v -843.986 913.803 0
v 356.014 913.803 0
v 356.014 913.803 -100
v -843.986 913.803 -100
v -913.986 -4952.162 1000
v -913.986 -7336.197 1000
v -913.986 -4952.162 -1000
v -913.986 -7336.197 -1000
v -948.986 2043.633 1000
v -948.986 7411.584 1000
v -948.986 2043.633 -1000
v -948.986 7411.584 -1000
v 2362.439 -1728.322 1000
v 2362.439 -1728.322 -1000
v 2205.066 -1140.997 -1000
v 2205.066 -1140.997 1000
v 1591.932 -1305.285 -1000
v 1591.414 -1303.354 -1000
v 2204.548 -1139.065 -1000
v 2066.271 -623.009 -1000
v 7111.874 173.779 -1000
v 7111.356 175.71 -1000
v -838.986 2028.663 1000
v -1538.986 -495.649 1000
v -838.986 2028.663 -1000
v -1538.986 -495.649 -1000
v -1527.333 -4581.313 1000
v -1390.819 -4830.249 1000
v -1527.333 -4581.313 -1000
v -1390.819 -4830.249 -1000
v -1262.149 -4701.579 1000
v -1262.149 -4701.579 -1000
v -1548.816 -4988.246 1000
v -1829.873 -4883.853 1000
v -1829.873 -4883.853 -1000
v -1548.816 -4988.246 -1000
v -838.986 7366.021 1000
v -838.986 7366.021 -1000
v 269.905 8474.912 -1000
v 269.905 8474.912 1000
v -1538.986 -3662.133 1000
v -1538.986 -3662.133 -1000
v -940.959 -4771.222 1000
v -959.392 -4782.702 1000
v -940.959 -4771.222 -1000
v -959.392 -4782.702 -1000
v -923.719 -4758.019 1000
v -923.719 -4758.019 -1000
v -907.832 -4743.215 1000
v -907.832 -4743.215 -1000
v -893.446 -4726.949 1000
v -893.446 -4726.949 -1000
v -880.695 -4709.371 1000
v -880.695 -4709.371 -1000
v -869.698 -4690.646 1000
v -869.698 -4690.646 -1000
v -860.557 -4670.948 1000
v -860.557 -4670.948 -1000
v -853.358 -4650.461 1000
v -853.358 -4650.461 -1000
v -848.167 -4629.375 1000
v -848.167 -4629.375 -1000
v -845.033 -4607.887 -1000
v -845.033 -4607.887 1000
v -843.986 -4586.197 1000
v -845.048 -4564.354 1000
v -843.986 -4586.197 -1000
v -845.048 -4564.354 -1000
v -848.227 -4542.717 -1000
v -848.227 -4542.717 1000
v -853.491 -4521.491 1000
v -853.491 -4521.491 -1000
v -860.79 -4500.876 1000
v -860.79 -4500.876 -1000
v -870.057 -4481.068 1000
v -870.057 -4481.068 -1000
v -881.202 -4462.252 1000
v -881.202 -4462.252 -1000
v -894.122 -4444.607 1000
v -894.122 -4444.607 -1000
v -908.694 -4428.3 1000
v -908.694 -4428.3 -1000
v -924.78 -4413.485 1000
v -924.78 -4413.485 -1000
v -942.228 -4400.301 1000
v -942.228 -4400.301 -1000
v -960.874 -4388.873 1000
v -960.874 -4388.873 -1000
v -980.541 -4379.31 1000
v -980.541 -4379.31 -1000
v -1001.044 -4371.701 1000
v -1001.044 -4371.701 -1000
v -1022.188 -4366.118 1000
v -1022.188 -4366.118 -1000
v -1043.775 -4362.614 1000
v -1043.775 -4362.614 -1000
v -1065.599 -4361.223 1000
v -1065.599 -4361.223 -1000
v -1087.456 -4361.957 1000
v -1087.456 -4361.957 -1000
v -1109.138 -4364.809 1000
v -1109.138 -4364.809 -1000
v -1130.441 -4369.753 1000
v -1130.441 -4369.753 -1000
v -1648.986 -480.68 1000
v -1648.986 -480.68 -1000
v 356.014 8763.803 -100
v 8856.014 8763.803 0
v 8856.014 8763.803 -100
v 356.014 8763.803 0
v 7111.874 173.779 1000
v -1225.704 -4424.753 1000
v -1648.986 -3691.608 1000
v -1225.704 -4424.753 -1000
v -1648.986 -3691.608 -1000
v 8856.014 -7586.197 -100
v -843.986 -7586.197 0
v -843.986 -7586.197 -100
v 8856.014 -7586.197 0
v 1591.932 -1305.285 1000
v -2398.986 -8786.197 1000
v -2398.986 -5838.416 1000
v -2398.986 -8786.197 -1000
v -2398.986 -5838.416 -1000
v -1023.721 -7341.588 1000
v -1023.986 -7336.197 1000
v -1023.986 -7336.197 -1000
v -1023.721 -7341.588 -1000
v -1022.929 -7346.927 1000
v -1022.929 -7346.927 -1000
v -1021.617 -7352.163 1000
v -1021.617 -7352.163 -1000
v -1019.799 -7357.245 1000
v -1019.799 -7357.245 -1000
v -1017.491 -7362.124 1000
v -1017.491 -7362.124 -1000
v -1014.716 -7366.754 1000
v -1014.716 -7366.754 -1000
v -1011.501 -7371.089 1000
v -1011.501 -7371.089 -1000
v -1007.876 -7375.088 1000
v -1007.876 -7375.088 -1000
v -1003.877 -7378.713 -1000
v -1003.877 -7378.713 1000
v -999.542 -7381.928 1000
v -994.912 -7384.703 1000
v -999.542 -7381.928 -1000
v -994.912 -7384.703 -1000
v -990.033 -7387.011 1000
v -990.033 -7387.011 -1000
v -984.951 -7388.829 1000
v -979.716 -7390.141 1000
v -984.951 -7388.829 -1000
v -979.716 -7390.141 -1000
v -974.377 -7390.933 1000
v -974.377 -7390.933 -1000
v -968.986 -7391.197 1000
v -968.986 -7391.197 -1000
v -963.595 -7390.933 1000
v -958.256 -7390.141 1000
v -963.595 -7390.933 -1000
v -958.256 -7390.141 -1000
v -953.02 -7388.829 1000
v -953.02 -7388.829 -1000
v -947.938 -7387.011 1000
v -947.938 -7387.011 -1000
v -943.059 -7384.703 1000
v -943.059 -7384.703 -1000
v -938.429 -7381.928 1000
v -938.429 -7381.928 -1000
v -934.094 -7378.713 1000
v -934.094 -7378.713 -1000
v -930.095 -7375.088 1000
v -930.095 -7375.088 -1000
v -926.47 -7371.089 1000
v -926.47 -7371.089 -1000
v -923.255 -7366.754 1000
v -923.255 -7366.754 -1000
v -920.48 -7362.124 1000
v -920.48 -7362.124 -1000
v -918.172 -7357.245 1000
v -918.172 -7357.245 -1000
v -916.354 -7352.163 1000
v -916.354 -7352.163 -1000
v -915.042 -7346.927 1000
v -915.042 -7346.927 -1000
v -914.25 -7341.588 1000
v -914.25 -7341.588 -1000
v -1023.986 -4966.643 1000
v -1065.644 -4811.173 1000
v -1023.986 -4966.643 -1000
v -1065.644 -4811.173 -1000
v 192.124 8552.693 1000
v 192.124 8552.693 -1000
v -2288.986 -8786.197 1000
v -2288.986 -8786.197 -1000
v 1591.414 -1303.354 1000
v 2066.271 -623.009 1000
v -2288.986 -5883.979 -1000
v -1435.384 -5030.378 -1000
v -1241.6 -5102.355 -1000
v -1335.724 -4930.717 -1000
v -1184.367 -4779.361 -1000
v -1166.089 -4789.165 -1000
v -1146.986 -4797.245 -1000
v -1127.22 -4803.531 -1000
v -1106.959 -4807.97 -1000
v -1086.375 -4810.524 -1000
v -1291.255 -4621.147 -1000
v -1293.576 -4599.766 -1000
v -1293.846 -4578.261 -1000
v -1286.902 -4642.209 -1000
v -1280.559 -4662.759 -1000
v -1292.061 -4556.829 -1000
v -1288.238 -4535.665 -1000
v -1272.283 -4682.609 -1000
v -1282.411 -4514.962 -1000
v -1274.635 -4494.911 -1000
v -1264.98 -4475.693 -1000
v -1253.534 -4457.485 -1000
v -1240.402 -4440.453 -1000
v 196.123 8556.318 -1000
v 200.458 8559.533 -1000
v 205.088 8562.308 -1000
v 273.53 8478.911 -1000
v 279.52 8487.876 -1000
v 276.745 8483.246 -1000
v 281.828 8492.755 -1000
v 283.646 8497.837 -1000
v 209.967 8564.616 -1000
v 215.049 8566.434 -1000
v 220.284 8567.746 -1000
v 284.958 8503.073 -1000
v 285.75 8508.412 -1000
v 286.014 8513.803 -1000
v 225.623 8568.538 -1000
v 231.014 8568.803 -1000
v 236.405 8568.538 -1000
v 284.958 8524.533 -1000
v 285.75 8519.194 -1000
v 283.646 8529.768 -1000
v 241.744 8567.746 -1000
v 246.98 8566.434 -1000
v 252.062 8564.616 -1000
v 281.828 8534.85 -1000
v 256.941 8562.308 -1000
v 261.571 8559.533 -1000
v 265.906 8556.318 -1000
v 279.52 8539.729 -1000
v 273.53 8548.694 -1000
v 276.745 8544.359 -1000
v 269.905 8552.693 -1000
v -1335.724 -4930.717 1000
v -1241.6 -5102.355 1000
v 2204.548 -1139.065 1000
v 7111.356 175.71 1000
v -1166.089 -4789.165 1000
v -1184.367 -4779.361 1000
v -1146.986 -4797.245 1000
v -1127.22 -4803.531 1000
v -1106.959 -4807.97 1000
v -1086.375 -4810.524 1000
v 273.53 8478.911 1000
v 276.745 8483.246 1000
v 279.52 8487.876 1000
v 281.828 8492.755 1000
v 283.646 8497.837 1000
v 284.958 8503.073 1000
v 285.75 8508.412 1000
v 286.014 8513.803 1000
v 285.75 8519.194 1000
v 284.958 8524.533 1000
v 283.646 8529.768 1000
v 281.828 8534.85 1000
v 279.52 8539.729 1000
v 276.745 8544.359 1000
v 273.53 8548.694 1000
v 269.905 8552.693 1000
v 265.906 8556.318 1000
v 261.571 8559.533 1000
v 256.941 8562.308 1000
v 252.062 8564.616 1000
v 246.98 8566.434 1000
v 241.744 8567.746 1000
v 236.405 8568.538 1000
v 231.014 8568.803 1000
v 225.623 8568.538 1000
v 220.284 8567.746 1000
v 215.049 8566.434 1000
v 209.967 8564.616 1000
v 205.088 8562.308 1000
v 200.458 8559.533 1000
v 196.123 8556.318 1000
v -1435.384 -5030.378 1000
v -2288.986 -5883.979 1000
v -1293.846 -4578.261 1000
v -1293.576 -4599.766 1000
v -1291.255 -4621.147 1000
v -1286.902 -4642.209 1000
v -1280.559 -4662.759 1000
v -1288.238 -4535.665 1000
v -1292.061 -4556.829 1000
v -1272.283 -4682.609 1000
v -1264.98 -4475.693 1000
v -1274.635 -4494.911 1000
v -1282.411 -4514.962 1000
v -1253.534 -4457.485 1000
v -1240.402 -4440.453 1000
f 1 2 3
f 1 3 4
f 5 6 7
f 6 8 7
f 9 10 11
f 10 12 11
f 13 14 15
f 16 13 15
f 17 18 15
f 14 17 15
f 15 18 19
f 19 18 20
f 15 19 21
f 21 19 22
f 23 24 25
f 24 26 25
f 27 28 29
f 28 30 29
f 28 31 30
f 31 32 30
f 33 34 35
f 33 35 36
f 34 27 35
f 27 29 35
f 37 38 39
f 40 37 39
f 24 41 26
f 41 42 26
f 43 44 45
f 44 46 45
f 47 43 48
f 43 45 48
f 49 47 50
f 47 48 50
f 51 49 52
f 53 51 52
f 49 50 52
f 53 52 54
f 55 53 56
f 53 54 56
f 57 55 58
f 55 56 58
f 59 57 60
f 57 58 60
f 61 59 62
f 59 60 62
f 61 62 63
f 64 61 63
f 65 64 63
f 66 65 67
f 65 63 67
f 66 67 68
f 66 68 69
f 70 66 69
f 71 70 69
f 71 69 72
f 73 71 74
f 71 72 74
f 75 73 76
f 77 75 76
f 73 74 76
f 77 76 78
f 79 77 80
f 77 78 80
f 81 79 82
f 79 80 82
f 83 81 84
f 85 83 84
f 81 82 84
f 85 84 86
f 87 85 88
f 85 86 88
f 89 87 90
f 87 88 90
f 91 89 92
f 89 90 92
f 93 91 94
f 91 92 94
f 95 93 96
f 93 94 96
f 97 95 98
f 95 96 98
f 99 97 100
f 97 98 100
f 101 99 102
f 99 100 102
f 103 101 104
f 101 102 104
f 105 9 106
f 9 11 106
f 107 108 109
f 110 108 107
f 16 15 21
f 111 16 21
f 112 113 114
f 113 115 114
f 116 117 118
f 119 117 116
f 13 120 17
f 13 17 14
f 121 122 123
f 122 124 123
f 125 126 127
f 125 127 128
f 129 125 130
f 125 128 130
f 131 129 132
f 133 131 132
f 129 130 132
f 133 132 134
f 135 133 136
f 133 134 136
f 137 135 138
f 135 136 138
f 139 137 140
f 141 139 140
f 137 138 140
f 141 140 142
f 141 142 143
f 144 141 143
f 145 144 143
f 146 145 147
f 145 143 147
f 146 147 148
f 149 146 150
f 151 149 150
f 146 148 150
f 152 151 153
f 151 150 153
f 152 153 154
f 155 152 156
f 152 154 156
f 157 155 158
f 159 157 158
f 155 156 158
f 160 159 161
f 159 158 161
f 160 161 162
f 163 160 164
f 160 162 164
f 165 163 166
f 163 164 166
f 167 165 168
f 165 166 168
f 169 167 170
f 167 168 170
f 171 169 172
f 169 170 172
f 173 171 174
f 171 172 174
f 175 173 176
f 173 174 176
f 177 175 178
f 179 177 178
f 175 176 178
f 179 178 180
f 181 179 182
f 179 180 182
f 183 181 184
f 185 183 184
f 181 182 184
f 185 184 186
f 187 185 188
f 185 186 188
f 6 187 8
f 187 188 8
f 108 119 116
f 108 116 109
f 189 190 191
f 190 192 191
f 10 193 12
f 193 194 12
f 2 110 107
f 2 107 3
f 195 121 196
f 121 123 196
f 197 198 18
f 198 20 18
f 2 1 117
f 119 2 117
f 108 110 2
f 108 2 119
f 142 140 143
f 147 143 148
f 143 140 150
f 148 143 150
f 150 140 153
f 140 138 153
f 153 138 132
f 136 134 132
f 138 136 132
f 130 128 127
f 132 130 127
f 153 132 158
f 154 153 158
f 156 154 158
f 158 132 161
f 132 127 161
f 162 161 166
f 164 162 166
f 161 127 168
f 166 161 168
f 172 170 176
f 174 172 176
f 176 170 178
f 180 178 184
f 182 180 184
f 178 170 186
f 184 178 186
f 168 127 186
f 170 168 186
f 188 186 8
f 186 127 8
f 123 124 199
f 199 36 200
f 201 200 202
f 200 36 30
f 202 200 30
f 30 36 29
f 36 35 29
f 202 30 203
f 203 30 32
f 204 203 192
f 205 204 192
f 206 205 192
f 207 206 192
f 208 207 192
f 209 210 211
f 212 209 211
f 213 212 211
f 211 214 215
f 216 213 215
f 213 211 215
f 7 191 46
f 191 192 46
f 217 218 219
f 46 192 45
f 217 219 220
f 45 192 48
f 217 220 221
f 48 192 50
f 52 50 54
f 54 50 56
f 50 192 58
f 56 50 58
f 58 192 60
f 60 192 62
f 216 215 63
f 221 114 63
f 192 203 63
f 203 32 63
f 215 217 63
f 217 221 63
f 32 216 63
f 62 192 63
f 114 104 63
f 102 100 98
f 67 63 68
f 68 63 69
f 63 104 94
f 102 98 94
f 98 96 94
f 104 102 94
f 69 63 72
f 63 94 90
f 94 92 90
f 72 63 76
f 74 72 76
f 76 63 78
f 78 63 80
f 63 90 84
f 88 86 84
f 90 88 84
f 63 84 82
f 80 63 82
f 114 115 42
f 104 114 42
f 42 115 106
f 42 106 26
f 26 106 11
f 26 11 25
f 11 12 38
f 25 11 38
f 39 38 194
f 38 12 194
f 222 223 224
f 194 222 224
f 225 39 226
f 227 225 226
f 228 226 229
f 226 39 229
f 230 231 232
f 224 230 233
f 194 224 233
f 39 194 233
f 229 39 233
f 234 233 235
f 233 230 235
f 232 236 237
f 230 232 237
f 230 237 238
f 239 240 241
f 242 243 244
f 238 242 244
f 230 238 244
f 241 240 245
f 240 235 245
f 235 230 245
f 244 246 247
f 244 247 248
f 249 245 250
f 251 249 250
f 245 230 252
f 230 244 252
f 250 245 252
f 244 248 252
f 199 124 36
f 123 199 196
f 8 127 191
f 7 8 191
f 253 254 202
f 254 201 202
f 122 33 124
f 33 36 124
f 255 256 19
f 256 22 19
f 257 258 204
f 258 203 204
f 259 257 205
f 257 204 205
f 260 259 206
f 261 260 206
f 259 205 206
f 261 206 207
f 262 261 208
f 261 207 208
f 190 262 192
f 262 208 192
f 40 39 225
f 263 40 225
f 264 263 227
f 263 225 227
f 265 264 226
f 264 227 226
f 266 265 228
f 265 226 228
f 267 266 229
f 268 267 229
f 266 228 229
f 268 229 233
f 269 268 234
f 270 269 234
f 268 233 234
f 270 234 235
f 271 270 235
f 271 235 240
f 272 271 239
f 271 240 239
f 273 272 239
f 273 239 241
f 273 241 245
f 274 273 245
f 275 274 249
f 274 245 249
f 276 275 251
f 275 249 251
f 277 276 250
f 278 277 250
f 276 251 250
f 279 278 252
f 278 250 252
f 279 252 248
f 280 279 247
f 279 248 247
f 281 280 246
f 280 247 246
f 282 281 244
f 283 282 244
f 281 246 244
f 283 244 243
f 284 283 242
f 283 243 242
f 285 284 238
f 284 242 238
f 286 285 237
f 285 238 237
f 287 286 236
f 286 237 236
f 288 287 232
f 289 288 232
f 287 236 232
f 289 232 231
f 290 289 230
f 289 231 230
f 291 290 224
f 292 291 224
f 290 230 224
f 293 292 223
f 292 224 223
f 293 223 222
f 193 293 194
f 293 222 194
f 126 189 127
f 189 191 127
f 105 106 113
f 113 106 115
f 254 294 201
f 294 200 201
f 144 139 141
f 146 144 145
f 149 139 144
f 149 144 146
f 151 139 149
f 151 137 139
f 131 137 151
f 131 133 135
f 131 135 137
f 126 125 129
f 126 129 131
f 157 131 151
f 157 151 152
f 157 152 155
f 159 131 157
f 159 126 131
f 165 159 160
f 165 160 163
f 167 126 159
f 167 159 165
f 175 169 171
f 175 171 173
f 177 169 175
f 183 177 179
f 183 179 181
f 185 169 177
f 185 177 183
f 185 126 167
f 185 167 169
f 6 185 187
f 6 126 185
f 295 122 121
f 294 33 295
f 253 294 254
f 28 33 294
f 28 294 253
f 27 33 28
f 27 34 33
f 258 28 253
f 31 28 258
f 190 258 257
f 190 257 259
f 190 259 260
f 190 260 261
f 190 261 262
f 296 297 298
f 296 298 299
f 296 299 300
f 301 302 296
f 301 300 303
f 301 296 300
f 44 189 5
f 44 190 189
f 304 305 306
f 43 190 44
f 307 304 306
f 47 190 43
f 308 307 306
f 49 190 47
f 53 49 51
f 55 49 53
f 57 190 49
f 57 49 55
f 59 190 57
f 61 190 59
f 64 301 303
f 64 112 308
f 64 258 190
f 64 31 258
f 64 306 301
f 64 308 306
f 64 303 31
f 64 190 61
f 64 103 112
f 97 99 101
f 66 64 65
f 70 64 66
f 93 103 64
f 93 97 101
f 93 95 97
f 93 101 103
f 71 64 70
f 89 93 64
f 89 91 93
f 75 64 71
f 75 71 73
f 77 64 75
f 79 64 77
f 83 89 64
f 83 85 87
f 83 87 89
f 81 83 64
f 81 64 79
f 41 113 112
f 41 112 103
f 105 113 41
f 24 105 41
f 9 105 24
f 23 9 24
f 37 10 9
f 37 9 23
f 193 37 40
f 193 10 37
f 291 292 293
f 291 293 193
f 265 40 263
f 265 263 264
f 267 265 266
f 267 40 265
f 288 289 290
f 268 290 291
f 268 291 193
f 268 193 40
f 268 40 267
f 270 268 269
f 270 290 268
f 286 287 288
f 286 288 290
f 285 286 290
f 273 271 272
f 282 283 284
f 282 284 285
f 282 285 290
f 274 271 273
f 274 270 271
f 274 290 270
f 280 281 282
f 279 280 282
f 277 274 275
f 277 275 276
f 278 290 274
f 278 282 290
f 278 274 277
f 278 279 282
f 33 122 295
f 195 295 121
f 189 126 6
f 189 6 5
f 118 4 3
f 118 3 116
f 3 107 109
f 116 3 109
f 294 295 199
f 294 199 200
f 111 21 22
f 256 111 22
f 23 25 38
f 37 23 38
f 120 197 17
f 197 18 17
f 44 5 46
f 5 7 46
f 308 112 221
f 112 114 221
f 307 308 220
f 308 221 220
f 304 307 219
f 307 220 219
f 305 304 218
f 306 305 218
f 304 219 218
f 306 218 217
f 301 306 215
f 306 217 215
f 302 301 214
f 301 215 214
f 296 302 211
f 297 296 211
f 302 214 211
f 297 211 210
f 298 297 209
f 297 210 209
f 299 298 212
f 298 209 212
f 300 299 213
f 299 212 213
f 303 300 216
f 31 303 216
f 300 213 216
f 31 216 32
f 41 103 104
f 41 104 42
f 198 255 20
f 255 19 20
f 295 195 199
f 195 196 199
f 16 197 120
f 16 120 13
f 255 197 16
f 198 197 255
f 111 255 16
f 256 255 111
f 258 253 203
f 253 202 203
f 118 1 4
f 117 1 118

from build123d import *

# Parameters (mm, degrees)
F1_DEPTH      = 100
F3_DEPTH      = 1000
F3_DEPTH_BACK = 1000


# Not quite as in the source:
# - a feature names something its author has since deleted; it is built from what else it names


with BuildPart() as f1:
    # F0 (on Top) → F1 (new body)
    with BuildSketch(Plane.XY):
        Polygon((-843.9855575562, 913.8026237488), (-843.9855575561, -7586.1973762512), (8856.0144424439, -7586.1973762512), (8856.0144424438, 8763.8026237488), (356.0144424438, 8763.8026237488), (356.0144424438, 913.8026237488), align=None)
    extrude(amount=-F1_DEPTH)


with BuildPart() as f3:
    # F2 (on Top) → F3 (new body, two sides)
    with BuildSketch(Plane.XY) as f3_sk:
        with BuildLine():
            ThreePointArc((269.9053154091, 8474.9117507835), (281.827816732, 8492.7550349687), (286.0144424438, 8513.8026237488))
            ThreePointArc((286.0144424438, 8513.8026237488), (252.0620312239, 8564.6159980369), (192.1235694786, 8552.693496714))
            Line((192.1235694786, 8552.693496714), (269.9053154091, 8474.9117507835))
        make_face()
        with BuildLine():
            Line((269.9053154091, 8474.9117507835), (192.1235694786, 8552.693496714))
            ThreePointArc((192.1235694786, 8552.693496714), (192.1235694786, 8474.9117507835), (269.9053154091, 8474.9117507835))
        make_face()
        with BuildLine():
            ThreePointArc((269.9053154091, 8474.9117507835), (192.1235694786, 8474.9117507835), (192.1235694786, 8552.693496714))
            Line((192.1235694786, 8552.693496714), (-948.9855575562, 7411.5843696793))
            Line((-948.9855575562, 7411.5843696793), (-948.9855575562, 2043.63269294))
            Line((-948.9855575562, 2043.63269294), (-1648.9855575562, -480.6796410505))
            Line((-1648.9855575562, -480.6796410505), (-1648.9855575562, -3691.6079078613))
            Line((-1648.9855575562, -3691.6079078613), (-1225.7040759107, -4424.7529399743))
            ThreePointArc((-1225.7040759107, -4424.7529399743), (-1181.4855575561, -4391.3416603997), (-1130.4412814944, -4369.7529399743))
            Line((-1130.4412814944, -4369.7529399743), (-1538.9855575562, -3662.1334966938))
            Line((-1538.9855575562, -3662.1334966938), (-1538.9855575562, -495.6488760565))
            Line((-1538.9855575562, -495.6488760565), (-838.9855575562, 2028.663457934))
            Line((-838.9855575562, 2028.663457934), (-838.9855575562, 7366.0208778183))
            Line((-838.9855575562, 7366.0208778183), (269.9053154091, 8474.9117507835))
        make_face()
        with BuildLine():
            ThreePointArc((-1130.4412814944, -4369.7529399743), (-1181.4855575561, -4391.3416603997), (-1225.7040759107, -4424.7529399743))
            ThreePointArc((-1225.7040759107, -4424.7529399743), (-1292.0606513653, -4556.8289830017), (-1262.1489167268, -4701.5789894914))
            ThreePointArc((-1262.1489167268, -4701.5789894914), (-1228.0845833231, -4745.2964020182), (-1184.3671707963, -4779.3607354219))
            ThreePointArc((-1184.3671707963, -4779.3607354219), (-1127.2198427042, -4803.5306871663), (-1065.6438289459, -4811.1725589934))
            ThreePointArc((-1065.6438289459, -4811.1725589934), (-1010.7512724081, -4803.5306871663), (-959.3919880541, -4782.7024640322))
            ThreePointArc((-959.3919880541, -4782.7024640322), (-874.970670063, -4700.1413248883), (-843.9855575562, -4586.1973762512))
            ThreePointArc((-843.9855575562, -4586.1973762512), (-933.3436353604, -4406.6806111761), (-1130.4412814944, -4369.7529399743))
        make_face()
        with BuildLine():
            ThreePointArc((-1184.3671707963, -4779.3607354219), (-1228.0845833231, -4745.2964020182), (-1262.1489167268, -4701.5789894914))
            Line((-1262.1489167268, -4701.5789894914), (-1390.8192221094, -4830.249294874))
            Line((-1390.8192221094, -4830.249294874), (-1335.7238024601, -4930.7173670857))
            Line((-1335.7238024601, -4930.7173670857), (-1184.3671707963, -4779.3607354219))
        make_face()
        Polygon((-1335.7238024601, -4930.7173670857), (-1390.8192221094, -4830.249294874), (-1548.8158805226, -4988.2459532871), (-1435.3841341858, -5030.3776988114), align=None)
        Polygon((-1548.8158805226, -4988.2459532871), (-1390.8192221094, -4830.249294874), (-1527.3326635361, -4581.3131332397), (-1829.8729658127, -4883.8534355164), align=None)
        with BuildLine():
            Line((-913.9855575561, -4952.1615696408), (-959.3919880541, -4782.7024640322))
            ThreePointArc((-959.3919880541, -4782.7024640322), (-1010.7512724081, -4803.5306871663), (-1065.6438289459, -4811.1725589934))
            Line((-1065.6438289459, -4811.1725589934), (-1023.9855575561, -4966.6433443754))
            Line((-1023.9855575561, -4966.6433443754), (-1023.9855575561, -7336.1973762512))
            ThreePointArc((-1023.9855575561, -7336.1973762512), (-968.9855575561, -7281.1973762512), (-913.9855575561, -7336.1973762512))
            Line((-913.9855575561, -7336.1973762512), (-913.9855575561, -4952.1615696408))
        make_face()
        Polygon((-1241.6001558304, -5102.3545265198), (-1335.7238024601, -4930.7173670857), (-1435.3841341858, -5030.3776988114), align=None)
        Polygon((-1435.3841341858, -5030.3776988114), (-1548.8158805226, -4988.2459532871), (-2398.9855575561, -5838.4156303207), (-2398.9855575561, -8786.1973762512), (-2288.9855575561, -8786.1973762512), (-2288.9855575561, -5883.9791221817), align=None)
        with BuildLine():
            ThreePointArc((-1023.9855575561, -7336.1973762512), (-968.9855575561, -7391.1973762512), (-913.9855575561, -7336.1973762512))
            ThreePointArc((-913.9855575561, -7336.1973762512), (-968.9855575561, -7281.1973762512), (-1023.9855575561, -7336.1973762512))
        make_face()
    extrude(amount=-F3_DEPTH)
    extrude(f3_sk.sketch, amount=F3_DEPTH_BACK)


with BuildPart() as f3b:
    # F2 (on Top) → F3, piece 2 (new body, two sides)
    with BuildSketch(Plane.XY) as f3_2_sk:
        Polygon((7111.8739150801, 173.7785974403), (7111.3562769899, 175.7104490929), (2204.5480176534, -1139.0648614107), (2205.0656557436, -1140.9967130633), align=None)
        Polygon((2205.0656557436, -1140.9967130633), (2204.5480176534, -1139.0648614107), (1591.4141720975, -1303.3535801796), (1591.9318101877, -1305.2854318322), align=None)
        Polygon((1591.4141720975, -1303.3535801796), (2204.5480176534, -1139.0648614107), (2066.2712834871, -623.0090639974), align=None)
        Polygon((2362.4389377281, -1728.3217971832), (2205.0656557436, -1140.9967130633), (1591.9318101877, -1305.2854318322), align=None)
    extrude(amount=-F3_DEPTH)
    extrude(f3_2_sk.sketch, amount=F3_DEPTH_BACK)


solid = Compound([f1.part, f3.part, f3b.part])
